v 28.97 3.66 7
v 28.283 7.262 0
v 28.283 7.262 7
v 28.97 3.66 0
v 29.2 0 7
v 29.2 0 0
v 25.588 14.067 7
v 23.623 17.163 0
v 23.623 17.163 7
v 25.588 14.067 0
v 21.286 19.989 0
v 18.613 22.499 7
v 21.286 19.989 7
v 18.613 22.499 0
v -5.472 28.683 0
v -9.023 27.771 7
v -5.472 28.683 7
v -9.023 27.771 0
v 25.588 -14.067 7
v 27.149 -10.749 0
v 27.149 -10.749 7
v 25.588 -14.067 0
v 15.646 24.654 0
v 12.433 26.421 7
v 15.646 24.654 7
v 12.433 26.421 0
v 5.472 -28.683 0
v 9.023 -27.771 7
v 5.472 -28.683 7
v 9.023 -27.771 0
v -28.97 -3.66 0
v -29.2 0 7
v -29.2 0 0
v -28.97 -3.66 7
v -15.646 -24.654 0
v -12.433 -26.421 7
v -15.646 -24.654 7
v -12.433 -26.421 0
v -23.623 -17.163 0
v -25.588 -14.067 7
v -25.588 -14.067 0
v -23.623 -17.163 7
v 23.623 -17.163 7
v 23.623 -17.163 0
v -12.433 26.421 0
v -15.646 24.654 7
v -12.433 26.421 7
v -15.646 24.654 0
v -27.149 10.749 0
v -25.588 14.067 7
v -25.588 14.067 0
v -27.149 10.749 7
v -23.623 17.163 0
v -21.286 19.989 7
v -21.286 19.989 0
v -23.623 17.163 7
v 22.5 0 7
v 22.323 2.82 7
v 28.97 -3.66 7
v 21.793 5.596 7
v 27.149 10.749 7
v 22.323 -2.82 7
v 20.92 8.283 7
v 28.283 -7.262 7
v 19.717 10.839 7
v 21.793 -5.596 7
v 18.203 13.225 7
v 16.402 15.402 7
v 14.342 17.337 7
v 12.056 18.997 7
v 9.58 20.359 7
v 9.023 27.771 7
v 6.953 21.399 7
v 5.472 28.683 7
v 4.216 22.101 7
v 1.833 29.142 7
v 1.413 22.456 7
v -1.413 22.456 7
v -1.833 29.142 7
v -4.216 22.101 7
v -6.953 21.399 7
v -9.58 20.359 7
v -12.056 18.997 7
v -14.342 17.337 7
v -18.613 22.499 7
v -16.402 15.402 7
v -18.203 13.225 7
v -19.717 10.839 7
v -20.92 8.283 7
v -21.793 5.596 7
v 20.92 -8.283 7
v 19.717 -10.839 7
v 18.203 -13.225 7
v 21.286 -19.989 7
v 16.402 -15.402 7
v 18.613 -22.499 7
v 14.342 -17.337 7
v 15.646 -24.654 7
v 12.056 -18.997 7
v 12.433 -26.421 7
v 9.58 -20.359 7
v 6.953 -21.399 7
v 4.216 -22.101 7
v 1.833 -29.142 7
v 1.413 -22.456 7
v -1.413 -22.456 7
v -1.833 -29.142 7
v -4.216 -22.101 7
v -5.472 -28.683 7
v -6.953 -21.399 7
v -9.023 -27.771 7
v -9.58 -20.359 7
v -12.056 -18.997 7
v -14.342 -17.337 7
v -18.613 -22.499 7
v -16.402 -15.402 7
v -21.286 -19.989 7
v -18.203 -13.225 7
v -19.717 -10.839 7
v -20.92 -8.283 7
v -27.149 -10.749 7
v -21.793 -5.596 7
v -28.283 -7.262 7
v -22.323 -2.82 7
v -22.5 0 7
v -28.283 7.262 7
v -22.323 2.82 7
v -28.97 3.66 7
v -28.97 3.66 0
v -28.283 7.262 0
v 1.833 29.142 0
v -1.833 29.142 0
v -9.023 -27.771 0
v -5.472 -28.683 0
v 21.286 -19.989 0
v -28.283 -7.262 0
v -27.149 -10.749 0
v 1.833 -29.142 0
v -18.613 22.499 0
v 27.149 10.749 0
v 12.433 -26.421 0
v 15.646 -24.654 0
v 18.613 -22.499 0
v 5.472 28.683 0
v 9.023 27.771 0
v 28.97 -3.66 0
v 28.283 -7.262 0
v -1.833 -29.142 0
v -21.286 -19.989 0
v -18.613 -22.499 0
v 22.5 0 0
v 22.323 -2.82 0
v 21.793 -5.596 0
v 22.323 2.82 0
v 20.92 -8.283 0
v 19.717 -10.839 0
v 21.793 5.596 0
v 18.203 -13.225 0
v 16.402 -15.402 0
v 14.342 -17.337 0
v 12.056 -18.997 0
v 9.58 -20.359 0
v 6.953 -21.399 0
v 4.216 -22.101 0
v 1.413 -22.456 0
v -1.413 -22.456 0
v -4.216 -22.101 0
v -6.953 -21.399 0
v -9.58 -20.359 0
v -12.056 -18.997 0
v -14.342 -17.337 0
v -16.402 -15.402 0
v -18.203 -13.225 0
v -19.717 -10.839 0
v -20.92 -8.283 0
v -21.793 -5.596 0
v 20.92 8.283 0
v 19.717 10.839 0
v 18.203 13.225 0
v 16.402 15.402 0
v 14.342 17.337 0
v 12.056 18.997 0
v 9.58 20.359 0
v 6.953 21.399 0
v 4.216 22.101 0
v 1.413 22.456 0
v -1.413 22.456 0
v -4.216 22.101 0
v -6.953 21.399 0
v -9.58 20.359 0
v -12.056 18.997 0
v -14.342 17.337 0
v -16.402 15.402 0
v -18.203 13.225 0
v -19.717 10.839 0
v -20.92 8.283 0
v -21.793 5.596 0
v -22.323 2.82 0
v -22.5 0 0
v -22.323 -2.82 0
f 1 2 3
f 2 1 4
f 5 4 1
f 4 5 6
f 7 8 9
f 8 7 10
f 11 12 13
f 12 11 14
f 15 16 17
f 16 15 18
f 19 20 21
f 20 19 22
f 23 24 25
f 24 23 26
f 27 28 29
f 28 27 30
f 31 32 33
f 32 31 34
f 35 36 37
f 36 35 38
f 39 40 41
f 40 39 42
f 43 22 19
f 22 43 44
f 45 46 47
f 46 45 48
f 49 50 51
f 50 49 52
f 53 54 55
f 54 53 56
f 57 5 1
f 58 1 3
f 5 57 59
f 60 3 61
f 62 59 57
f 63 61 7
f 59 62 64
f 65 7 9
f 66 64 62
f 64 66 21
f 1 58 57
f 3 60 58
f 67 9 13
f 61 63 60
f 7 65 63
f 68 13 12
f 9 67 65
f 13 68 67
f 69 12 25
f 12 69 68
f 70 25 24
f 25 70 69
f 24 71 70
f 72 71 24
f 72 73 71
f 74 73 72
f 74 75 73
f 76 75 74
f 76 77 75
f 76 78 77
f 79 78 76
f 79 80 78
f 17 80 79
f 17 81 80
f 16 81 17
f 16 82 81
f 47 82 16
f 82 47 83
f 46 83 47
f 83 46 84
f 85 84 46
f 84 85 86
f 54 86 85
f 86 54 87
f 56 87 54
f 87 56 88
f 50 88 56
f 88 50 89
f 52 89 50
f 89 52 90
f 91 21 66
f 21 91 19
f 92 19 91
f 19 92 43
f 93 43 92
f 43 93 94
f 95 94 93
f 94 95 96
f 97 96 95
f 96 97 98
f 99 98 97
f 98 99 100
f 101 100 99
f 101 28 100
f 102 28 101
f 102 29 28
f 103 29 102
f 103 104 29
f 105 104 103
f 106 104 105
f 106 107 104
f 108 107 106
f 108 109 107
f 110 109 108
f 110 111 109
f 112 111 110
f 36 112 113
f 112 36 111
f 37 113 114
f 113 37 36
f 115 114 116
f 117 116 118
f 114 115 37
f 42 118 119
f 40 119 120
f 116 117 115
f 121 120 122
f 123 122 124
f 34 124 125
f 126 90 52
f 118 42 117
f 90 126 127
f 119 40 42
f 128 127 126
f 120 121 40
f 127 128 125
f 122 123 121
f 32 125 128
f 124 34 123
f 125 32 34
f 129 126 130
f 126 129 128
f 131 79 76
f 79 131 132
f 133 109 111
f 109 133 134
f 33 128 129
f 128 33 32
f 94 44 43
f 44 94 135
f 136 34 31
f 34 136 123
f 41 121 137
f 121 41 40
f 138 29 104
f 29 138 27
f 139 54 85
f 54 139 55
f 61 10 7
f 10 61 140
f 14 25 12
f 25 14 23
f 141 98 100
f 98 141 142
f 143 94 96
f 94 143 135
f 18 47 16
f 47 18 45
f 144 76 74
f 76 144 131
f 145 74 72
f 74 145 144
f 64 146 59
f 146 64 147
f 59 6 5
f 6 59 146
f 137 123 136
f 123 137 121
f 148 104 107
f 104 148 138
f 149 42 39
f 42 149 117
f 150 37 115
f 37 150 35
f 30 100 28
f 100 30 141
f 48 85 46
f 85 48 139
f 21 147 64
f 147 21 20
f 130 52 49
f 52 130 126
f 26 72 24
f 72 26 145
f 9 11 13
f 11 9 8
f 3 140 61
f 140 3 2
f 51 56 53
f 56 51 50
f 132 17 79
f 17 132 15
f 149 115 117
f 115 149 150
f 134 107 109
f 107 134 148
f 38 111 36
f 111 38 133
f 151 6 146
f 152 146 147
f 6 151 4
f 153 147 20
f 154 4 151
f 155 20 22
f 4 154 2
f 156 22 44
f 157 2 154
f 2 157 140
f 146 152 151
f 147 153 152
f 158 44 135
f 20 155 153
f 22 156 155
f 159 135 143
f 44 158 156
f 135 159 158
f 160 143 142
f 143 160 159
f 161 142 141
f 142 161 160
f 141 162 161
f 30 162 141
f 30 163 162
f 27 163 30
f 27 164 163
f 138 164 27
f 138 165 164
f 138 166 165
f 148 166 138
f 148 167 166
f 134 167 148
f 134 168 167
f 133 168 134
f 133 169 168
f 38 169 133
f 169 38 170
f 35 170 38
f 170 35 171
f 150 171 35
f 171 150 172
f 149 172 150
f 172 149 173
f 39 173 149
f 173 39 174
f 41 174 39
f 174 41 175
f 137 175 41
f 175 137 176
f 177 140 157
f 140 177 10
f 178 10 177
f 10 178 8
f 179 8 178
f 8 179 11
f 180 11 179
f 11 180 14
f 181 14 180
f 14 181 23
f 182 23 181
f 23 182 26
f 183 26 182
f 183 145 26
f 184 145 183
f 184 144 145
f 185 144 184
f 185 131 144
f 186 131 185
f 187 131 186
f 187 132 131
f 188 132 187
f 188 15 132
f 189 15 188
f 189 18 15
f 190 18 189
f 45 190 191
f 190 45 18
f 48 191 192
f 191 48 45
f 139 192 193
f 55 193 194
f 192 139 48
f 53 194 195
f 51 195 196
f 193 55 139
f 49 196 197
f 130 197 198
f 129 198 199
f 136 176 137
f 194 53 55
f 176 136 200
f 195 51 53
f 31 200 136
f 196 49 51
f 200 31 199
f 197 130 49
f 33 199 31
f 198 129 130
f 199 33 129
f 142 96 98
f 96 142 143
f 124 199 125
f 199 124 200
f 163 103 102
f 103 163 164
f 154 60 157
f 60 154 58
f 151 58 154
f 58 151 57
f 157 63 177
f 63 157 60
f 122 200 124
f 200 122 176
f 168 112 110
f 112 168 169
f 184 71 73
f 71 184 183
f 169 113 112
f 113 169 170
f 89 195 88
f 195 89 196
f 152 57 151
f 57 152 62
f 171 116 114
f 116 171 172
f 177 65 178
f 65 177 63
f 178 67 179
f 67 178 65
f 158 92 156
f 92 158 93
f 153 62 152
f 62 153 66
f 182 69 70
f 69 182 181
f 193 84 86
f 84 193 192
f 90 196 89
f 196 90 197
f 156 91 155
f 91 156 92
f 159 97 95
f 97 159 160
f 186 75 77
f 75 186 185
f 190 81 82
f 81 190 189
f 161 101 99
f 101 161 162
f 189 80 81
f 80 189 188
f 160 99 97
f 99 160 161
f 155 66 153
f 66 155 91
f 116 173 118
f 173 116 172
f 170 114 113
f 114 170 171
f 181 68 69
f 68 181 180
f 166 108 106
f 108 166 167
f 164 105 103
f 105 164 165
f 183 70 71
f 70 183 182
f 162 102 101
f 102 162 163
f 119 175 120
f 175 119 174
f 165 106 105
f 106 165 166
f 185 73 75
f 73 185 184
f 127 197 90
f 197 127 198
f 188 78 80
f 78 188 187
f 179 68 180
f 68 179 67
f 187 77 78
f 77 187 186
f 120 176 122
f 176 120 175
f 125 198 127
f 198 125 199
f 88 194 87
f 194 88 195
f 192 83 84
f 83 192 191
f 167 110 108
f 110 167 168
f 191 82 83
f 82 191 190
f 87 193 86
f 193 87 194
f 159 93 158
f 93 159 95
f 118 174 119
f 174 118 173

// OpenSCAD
$fn = 50;


difference() {
	union() {
		cylinder(h = 7, r = 29.2000000000);
	}
	union() {
		cylinder(h = 7, r = 22.5000000000);
	}
}
